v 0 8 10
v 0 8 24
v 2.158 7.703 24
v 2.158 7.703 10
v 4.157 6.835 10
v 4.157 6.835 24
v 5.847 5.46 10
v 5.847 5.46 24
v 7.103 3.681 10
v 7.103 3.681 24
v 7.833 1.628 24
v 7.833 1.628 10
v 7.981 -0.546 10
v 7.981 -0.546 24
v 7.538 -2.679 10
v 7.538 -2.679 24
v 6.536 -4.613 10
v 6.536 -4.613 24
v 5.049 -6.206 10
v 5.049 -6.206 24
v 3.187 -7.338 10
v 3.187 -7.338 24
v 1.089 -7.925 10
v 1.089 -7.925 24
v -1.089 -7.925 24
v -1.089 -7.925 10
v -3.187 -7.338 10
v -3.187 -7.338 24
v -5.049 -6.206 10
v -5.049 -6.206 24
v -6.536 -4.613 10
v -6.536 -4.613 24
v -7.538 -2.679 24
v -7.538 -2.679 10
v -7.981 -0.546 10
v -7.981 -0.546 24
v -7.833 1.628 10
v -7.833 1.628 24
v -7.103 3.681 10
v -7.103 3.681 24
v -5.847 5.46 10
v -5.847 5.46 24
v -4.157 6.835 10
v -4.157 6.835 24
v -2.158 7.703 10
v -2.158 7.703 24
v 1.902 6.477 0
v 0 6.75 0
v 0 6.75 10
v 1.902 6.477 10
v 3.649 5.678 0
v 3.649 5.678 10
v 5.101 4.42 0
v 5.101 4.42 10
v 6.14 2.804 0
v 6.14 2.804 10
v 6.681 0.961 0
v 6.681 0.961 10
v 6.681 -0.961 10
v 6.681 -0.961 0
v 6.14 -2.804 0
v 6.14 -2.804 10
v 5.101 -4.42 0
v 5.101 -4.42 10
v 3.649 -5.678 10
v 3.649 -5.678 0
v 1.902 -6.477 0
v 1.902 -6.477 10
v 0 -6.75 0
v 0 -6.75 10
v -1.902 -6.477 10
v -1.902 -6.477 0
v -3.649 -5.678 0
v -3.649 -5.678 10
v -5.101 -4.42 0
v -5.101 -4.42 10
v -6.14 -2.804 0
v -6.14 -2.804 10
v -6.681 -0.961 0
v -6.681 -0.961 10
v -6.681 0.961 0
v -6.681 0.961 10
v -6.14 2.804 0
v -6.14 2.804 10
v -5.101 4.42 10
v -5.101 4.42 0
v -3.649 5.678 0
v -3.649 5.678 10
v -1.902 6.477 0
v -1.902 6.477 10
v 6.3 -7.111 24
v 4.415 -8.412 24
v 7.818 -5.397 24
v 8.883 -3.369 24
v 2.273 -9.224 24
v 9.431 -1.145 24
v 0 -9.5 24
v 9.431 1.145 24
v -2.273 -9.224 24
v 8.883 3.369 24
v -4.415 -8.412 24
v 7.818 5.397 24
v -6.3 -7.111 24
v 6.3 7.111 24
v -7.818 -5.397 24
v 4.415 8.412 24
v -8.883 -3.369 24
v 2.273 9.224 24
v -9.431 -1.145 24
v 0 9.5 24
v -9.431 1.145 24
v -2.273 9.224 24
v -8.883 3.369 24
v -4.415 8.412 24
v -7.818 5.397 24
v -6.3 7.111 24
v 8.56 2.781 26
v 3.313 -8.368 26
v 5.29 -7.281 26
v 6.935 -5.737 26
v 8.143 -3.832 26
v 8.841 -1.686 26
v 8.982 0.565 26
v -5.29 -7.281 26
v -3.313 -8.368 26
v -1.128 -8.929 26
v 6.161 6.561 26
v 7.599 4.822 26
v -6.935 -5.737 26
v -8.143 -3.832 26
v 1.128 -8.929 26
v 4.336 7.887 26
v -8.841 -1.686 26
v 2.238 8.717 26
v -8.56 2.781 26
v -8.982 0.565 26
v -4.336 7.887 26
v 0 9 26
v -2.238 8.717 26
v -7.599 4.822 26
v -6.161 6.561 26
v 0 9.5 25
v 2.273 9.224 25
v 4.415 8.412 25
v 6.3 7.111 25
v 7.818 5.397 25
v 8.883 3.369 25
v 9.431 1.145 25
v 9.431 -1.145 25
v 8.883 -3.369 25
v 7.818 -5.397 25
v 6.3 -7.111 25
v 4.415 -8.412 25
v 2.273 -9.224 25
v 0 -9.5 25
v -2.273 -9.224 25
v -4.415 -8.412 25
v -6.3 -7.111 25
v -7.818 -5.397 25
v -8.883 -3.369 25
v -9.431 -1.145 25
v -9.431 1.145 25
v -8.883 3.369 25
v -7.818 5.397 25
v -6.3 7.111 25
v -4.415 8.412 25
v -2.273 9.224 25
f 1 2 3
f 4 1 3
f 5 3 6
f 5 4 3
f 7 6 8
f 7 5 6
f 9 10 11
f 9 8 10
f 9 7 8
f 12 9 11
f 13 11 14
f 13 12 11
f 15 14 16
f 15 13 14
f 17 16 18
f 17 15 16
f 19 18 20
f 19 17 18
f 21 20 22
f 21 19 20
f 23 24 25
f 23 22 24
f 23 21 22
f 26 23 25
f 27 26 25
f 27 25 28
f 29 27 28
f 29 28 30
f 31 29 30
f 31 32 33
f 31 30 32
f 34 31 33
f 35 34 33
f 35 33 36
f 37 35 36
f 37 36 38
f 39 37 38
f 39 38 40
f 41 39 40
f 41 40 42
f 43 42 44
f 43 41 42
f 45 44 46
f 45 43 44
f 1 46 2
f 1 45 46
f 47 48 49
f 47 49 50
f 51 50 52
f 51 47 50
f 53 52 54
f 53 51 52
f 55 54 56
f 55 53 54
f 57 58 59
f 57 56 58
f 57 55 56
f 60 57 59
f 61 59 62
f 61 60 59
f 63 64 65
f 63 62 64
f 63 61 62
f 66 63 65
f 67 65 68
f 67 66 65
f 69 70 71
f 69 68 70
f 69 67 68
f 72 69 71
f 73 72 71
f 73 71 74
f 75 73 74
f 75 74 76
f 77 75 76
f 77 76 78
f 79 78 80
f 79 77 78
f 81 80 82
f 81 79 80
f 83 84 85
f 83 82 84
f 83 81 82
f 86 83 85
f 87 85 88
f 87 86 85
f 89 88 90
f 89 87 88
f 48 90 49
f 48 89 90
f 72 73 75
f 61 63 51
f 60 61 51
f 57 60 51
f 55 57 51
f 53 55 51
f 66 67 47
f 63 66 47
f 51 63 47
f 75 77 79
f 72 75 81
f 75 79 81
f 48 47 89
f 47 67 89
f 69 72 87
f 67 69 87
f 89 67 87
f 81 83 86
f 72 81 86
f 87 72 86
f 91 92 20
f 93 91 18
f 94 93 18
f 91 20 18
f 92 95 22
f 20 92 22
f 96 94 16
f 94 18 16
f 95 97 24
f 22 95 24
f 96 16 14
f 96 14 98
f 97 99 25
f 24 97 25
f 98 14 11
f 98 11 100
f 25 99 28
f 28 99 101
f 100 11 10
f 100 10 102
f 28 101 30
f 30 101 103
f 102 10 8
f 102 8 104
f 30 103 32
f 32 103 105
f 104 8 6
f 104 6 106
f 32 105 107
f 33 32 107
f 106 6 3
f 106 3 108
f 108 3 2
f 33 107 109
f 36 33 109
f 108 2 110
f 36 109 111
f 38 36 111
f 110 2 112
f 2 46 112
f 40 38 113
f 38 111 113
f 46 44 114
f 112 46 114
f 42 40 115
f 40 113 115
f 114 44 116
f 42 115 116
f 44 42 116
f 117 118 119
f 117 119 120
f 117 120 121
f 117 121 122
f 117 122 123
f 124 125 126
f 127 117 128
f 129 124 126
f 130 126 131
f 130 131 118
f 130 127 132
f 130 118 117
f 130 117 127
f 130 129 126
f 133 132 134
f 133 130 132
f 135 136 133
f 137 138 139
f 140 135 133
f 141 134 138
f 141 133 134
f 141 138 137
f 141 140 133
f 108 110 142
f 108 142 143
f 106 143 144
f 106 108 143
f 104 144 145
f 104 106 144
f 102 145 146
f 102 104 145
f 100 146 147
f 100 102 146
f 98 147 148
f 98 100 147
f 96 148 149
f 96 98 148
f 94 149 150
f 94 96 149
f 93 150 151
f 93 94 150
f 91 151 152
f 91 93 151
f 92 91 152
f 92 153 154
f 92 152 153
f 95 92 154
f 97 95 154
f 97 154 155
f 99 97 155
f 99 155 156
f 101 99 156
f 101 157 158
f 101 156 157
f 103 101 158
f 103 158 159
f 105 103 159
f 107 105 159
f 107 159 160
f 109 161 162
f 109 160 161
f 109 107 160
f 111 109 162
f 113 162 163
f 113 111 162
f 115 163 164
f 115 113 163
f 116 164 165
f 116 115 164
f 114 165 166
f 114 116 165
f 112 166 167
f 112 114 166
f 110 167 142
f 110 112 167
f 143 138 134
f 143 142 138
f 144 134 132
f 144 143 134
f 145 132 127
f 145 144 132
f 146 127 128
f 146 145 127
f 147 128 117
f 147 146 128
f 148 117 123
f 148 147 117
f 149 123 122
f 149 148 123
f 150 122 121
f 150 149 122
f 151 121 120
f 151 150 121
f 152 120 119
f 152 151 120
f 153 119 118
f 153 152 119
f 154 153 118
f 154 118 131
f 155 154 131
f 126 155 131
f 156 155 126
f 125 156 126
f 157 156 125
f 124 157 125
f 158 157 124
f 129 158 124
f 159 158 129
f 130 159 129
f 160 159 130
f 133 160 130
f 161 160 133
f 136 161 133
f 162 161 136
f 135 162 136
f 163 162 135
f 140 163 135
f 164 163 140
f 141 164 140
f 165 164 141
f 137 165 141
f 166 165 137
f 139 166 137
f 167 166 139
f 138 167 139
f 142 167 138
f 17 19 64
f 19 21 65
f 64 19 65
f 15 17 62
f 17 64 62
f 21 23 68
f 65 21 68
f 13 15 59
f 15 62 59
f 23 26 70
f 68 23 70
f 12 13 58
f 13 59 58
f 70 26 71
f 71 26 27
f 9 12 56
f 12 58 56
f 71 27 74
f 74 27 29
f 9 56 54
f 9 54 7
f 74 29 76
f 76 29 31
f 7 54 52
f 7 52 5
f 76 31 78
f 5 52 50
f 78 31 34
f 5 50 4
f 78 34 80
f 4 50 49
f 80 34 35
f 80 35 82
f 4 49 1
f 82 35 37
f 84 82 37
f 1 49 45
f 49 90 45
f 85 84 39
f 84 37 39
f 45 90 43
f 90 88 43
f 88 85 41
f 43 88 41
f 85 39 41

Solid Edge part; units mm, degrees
sketch "Sketch1" plane through (0, 0, 0) normal (1, 0, 0) x (0, 1, 0)
  line L0 (9.5, 25) -> (9.5, 24)
  line L1 (9.5, 24) -> (8, 24)
  line L2 (8, 24) -> (8, 10)
  line L3 (8, 10) -> (6.75, 10)
  line L4 (6.75, 10) -> (6.75, 0)
  line L5 (6.75, 0) -> (0, 0)
  line L6 (0, 26) -> (9, 26)
  line L7 (9, 26) -> (9.5, 25)
  dimension "D1" = 26
  dimension "D2" = 14
  dimension "D3" = 1
  dimension "D4" = 1
revolve "RevolvedProtrusion1" add sketch "Sketch1" angle 360 about axis through (0, 0, 0) along (0, 0, 1)
properties material "Stainless steel"
